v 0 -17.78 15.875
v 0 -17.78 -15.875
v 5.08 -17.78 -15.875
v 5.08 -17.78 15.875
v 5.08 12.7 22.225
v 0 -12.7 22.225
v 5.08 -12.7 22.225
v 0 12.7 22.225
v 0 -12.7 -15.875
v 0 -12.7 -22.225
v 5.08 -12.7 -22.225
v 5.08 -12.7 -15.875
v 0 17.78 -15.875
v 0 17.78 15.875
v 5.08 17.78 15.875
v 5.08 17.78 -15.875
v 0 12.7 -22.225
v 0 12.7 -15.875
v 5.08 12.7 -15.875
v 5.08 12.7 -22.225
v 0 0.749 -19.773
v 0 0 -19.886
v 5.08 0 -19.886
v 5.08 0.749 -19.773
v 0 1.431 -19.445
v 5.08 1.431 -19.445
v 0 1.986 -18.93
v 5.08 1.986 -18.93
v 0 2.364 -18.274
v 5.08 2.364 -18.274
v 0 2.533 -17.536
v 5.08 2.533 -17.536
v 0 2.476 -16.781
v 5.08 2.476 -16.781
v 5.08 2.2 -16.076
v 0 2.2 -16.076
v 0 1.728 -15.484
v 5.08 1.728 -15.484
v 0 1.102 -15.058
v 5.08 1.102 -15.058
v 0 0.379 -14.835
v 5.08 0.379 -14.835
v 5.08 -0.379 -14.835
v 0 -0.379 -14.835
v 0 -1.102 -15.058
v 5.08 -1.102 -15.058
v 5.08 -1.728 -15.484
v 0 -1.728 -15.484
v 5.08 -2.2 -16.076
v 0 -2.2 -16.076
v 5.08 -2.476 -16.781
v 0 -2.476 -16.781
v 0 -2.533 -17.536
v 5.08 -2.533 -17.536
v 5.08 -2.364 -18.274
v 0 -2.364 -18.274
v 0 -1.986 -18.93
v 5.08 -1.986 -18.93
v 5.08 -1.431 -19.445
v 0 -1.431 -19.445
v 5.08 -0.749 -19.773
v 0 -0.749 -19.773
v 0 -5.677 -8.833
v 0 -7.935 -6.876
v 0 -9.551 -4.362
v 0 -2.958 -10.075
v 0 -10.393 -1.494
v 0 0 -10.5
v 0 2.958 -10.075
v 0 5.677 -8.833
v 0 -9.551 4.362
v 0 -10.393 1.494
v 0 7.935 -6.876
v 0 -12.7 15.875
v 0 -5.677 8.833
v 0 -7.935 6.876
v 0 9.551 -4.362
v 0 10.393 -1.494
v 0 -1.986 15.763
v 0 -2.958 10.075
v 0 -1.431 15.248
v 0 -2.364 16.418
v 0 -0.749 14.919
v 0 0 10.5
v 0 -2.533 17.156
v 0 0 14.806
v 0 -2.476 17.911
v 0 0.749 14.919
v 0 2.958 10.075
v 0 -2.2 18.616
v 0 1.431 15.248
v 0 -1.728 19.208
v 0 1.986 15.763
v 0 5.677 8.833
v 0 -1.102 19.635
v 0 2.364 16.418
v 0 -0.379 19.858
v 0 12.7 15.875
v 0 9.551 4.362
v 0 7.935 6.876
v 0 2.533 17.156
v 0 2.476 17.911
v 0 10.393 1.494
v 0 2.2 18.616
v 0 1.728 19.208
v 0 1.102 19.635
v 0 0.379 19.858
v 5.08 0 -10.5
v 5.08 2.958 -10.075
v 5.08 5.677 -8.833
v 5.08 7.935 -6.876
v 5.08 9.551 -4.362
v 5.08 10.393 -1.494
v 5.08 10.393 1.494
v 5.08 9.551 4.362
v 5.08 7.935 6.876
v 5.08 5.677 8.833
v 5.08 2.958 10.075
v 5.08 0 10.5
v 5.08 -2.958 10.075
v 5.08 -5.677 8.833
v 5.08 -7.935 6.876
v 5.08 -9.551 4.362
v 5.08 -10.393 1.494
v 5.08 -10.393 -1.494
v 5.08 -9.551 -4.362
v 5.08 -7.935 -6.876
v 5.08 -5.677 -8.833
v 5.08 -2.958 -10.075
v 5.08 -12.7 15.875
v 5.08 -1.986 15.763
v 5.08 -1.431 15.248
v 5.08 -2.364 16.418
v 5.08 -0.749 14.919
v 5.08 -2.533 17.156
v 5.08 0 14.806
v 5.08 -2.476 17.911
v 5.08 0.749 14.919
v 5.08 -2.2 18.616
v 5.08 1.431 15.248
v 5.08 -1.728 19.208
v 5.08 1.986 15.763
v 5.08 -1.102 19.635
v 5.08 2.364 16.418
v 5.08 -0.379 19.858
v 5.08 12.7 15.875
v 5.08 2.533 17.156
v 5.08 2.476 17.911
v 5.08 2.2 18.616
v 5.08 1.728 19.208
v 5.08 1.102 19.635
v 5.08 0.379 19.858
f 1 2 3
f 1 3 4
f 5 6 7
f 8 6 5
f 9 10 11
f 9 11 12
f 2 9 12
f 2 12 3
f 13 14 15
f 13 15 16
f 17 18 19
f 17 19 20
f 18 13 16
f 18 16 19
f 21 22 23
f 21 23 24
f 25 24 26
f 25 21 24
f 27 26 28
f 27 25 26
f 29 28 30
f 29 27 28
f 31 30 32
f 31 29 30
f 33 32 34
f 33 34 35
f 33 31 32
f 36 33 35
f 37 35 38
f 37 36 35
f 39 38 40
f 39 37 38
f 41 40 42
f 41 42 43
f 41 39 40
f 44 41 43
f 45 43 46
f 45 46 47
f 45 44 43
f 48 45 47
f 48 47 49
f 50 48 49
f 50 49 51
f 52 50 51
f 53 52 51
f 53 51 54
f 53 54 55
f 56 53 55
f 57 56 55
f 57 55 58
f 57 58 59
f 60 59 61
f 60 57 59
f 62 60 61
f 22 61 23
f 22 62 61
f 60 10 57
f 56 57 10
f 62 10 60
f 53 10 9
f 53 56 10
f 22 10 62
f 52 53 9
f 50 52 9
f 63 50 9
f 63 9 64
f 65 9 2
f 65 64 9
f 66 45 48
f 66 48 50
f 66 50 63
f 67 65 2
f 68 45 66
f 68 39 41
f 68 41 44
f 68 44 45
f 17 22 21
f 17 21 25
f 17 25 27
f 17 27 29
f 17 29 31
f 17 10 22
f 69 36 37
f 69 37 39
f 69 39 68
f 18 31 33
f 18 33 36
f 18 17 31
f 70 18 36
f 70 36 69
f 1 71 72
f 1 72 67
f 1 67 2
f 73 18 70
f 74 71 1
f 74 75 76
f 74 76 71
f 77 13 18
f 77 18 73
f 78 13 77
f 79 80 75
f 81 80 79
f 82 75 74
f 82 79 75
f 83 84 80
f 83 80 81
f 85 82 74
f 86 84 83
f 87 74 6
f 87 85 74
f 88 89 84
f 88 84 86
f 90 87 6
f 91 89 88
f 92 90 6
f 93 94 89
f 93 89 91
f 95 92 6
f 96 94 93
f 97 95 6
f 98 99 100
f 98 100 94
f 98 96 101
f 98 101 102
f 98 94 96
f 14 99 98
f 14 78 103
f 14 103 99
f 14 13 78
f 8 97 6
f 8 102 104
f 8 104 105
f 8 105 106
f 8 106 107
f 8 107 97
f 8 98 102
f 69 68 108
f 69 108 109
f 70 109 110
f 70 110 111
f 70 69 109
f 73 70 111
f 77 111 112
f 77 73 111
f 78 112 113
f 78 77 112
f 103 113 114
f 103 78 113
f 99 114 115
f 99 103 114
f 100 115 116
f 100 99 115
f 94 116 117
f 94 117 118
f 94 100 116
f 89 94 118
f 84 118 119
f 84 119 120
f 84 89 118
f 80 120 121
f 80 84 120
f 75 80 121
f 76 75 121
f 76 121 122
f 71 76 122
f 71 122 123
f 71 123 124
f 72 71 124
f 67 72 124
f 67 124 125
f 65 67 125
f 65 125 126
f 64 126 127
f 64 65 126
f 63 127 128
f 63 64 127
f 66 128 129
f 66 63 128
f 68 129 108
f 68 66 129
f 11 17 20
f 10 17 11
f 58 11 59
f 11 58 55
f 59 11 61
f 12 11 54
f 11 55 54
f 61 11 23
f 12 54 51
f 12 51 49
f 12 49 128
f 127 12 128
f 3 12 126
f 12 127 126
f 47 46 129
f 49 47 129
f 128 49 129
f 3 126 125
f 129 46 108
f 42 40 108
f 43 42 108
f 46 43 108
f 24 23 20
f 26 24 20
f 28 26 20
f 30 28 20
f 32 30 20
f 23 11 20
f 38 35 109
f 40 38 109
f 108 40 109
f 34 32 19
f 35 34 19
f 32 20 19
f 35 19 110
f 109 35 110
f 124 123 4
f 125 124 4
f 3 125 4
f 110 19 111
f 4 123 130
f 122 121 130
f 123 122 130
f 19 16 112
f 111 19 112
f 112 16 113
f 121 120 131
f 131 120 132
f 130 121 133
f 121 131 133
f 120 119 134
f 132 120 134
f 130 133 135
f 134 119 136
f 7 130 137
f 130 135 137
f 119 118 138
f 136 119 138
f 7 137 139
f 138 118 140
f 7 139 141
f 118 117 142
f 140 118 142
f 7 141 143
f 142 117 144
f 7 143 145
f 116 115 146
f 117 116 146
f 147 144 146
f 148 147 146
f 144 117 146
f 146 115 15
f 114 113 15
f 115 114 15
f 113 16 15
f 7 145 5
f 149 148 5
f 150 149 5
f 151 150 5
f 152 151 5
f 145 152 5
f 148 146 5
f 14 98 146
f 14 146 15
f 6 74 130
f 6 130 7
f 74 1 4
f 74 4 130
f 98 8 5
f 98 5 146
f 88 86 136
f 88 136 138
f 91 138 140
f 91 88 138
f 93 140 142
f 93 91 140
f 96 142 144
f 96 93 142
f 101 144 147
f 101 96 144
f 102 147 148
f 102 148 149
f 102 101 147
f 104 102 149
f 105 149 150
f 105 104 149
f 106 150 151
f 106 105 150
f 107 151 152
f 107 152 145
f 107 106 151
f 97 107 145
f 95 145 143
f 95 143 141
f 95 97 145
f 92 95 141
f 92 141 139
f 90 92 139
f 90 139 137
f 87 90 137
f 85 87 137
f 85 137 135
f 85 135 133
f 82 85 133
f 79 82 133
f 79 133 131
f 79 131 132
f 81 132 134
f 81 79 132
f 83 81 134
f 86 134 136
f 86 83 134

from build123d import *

# Parameters (mm, degrees)
SKETCH1_R           = 10.499999955
SKETCH1_R_2         = 2.54
BOSS_EXTRUDE1_DEPTH = 5.08


with BuildPart() as part:
    # Sketch1 → Boss-Extrude1 (new body)
    with BuildSketch(Plane(origin=(0, 0, 0), x_dir=(0, 0, -1), z_dir=(1, 0, 0))):
        Polygon((-15.875, 12.7), (-22.225, 12.7), (-22.225, -12.7), (-15.875, -12.7), (-15.875, -17.78), (15.875, -17.78), (15.875, -12.7), (22.225, -12.7), (22.225, 12.7), (15.875, 12.7), (15.875, 17.78), (-15.875, 17.78), align=None)
        Circle(SKETCH1_R, mode=Mode.SUBTRACT)
        with Locations((17.346281091, 0)):
            Circle(SKETCH1_R_2, mode=Mode.SUBTRACT)
        with Locations((-17.346281091, 0)):
            Circle(SKETCH1_R_2, mode=Mode.SUBTRACT)
    extrude(amount=BOSS_EXTRUDE1_DEPTH)


solid = part.part
